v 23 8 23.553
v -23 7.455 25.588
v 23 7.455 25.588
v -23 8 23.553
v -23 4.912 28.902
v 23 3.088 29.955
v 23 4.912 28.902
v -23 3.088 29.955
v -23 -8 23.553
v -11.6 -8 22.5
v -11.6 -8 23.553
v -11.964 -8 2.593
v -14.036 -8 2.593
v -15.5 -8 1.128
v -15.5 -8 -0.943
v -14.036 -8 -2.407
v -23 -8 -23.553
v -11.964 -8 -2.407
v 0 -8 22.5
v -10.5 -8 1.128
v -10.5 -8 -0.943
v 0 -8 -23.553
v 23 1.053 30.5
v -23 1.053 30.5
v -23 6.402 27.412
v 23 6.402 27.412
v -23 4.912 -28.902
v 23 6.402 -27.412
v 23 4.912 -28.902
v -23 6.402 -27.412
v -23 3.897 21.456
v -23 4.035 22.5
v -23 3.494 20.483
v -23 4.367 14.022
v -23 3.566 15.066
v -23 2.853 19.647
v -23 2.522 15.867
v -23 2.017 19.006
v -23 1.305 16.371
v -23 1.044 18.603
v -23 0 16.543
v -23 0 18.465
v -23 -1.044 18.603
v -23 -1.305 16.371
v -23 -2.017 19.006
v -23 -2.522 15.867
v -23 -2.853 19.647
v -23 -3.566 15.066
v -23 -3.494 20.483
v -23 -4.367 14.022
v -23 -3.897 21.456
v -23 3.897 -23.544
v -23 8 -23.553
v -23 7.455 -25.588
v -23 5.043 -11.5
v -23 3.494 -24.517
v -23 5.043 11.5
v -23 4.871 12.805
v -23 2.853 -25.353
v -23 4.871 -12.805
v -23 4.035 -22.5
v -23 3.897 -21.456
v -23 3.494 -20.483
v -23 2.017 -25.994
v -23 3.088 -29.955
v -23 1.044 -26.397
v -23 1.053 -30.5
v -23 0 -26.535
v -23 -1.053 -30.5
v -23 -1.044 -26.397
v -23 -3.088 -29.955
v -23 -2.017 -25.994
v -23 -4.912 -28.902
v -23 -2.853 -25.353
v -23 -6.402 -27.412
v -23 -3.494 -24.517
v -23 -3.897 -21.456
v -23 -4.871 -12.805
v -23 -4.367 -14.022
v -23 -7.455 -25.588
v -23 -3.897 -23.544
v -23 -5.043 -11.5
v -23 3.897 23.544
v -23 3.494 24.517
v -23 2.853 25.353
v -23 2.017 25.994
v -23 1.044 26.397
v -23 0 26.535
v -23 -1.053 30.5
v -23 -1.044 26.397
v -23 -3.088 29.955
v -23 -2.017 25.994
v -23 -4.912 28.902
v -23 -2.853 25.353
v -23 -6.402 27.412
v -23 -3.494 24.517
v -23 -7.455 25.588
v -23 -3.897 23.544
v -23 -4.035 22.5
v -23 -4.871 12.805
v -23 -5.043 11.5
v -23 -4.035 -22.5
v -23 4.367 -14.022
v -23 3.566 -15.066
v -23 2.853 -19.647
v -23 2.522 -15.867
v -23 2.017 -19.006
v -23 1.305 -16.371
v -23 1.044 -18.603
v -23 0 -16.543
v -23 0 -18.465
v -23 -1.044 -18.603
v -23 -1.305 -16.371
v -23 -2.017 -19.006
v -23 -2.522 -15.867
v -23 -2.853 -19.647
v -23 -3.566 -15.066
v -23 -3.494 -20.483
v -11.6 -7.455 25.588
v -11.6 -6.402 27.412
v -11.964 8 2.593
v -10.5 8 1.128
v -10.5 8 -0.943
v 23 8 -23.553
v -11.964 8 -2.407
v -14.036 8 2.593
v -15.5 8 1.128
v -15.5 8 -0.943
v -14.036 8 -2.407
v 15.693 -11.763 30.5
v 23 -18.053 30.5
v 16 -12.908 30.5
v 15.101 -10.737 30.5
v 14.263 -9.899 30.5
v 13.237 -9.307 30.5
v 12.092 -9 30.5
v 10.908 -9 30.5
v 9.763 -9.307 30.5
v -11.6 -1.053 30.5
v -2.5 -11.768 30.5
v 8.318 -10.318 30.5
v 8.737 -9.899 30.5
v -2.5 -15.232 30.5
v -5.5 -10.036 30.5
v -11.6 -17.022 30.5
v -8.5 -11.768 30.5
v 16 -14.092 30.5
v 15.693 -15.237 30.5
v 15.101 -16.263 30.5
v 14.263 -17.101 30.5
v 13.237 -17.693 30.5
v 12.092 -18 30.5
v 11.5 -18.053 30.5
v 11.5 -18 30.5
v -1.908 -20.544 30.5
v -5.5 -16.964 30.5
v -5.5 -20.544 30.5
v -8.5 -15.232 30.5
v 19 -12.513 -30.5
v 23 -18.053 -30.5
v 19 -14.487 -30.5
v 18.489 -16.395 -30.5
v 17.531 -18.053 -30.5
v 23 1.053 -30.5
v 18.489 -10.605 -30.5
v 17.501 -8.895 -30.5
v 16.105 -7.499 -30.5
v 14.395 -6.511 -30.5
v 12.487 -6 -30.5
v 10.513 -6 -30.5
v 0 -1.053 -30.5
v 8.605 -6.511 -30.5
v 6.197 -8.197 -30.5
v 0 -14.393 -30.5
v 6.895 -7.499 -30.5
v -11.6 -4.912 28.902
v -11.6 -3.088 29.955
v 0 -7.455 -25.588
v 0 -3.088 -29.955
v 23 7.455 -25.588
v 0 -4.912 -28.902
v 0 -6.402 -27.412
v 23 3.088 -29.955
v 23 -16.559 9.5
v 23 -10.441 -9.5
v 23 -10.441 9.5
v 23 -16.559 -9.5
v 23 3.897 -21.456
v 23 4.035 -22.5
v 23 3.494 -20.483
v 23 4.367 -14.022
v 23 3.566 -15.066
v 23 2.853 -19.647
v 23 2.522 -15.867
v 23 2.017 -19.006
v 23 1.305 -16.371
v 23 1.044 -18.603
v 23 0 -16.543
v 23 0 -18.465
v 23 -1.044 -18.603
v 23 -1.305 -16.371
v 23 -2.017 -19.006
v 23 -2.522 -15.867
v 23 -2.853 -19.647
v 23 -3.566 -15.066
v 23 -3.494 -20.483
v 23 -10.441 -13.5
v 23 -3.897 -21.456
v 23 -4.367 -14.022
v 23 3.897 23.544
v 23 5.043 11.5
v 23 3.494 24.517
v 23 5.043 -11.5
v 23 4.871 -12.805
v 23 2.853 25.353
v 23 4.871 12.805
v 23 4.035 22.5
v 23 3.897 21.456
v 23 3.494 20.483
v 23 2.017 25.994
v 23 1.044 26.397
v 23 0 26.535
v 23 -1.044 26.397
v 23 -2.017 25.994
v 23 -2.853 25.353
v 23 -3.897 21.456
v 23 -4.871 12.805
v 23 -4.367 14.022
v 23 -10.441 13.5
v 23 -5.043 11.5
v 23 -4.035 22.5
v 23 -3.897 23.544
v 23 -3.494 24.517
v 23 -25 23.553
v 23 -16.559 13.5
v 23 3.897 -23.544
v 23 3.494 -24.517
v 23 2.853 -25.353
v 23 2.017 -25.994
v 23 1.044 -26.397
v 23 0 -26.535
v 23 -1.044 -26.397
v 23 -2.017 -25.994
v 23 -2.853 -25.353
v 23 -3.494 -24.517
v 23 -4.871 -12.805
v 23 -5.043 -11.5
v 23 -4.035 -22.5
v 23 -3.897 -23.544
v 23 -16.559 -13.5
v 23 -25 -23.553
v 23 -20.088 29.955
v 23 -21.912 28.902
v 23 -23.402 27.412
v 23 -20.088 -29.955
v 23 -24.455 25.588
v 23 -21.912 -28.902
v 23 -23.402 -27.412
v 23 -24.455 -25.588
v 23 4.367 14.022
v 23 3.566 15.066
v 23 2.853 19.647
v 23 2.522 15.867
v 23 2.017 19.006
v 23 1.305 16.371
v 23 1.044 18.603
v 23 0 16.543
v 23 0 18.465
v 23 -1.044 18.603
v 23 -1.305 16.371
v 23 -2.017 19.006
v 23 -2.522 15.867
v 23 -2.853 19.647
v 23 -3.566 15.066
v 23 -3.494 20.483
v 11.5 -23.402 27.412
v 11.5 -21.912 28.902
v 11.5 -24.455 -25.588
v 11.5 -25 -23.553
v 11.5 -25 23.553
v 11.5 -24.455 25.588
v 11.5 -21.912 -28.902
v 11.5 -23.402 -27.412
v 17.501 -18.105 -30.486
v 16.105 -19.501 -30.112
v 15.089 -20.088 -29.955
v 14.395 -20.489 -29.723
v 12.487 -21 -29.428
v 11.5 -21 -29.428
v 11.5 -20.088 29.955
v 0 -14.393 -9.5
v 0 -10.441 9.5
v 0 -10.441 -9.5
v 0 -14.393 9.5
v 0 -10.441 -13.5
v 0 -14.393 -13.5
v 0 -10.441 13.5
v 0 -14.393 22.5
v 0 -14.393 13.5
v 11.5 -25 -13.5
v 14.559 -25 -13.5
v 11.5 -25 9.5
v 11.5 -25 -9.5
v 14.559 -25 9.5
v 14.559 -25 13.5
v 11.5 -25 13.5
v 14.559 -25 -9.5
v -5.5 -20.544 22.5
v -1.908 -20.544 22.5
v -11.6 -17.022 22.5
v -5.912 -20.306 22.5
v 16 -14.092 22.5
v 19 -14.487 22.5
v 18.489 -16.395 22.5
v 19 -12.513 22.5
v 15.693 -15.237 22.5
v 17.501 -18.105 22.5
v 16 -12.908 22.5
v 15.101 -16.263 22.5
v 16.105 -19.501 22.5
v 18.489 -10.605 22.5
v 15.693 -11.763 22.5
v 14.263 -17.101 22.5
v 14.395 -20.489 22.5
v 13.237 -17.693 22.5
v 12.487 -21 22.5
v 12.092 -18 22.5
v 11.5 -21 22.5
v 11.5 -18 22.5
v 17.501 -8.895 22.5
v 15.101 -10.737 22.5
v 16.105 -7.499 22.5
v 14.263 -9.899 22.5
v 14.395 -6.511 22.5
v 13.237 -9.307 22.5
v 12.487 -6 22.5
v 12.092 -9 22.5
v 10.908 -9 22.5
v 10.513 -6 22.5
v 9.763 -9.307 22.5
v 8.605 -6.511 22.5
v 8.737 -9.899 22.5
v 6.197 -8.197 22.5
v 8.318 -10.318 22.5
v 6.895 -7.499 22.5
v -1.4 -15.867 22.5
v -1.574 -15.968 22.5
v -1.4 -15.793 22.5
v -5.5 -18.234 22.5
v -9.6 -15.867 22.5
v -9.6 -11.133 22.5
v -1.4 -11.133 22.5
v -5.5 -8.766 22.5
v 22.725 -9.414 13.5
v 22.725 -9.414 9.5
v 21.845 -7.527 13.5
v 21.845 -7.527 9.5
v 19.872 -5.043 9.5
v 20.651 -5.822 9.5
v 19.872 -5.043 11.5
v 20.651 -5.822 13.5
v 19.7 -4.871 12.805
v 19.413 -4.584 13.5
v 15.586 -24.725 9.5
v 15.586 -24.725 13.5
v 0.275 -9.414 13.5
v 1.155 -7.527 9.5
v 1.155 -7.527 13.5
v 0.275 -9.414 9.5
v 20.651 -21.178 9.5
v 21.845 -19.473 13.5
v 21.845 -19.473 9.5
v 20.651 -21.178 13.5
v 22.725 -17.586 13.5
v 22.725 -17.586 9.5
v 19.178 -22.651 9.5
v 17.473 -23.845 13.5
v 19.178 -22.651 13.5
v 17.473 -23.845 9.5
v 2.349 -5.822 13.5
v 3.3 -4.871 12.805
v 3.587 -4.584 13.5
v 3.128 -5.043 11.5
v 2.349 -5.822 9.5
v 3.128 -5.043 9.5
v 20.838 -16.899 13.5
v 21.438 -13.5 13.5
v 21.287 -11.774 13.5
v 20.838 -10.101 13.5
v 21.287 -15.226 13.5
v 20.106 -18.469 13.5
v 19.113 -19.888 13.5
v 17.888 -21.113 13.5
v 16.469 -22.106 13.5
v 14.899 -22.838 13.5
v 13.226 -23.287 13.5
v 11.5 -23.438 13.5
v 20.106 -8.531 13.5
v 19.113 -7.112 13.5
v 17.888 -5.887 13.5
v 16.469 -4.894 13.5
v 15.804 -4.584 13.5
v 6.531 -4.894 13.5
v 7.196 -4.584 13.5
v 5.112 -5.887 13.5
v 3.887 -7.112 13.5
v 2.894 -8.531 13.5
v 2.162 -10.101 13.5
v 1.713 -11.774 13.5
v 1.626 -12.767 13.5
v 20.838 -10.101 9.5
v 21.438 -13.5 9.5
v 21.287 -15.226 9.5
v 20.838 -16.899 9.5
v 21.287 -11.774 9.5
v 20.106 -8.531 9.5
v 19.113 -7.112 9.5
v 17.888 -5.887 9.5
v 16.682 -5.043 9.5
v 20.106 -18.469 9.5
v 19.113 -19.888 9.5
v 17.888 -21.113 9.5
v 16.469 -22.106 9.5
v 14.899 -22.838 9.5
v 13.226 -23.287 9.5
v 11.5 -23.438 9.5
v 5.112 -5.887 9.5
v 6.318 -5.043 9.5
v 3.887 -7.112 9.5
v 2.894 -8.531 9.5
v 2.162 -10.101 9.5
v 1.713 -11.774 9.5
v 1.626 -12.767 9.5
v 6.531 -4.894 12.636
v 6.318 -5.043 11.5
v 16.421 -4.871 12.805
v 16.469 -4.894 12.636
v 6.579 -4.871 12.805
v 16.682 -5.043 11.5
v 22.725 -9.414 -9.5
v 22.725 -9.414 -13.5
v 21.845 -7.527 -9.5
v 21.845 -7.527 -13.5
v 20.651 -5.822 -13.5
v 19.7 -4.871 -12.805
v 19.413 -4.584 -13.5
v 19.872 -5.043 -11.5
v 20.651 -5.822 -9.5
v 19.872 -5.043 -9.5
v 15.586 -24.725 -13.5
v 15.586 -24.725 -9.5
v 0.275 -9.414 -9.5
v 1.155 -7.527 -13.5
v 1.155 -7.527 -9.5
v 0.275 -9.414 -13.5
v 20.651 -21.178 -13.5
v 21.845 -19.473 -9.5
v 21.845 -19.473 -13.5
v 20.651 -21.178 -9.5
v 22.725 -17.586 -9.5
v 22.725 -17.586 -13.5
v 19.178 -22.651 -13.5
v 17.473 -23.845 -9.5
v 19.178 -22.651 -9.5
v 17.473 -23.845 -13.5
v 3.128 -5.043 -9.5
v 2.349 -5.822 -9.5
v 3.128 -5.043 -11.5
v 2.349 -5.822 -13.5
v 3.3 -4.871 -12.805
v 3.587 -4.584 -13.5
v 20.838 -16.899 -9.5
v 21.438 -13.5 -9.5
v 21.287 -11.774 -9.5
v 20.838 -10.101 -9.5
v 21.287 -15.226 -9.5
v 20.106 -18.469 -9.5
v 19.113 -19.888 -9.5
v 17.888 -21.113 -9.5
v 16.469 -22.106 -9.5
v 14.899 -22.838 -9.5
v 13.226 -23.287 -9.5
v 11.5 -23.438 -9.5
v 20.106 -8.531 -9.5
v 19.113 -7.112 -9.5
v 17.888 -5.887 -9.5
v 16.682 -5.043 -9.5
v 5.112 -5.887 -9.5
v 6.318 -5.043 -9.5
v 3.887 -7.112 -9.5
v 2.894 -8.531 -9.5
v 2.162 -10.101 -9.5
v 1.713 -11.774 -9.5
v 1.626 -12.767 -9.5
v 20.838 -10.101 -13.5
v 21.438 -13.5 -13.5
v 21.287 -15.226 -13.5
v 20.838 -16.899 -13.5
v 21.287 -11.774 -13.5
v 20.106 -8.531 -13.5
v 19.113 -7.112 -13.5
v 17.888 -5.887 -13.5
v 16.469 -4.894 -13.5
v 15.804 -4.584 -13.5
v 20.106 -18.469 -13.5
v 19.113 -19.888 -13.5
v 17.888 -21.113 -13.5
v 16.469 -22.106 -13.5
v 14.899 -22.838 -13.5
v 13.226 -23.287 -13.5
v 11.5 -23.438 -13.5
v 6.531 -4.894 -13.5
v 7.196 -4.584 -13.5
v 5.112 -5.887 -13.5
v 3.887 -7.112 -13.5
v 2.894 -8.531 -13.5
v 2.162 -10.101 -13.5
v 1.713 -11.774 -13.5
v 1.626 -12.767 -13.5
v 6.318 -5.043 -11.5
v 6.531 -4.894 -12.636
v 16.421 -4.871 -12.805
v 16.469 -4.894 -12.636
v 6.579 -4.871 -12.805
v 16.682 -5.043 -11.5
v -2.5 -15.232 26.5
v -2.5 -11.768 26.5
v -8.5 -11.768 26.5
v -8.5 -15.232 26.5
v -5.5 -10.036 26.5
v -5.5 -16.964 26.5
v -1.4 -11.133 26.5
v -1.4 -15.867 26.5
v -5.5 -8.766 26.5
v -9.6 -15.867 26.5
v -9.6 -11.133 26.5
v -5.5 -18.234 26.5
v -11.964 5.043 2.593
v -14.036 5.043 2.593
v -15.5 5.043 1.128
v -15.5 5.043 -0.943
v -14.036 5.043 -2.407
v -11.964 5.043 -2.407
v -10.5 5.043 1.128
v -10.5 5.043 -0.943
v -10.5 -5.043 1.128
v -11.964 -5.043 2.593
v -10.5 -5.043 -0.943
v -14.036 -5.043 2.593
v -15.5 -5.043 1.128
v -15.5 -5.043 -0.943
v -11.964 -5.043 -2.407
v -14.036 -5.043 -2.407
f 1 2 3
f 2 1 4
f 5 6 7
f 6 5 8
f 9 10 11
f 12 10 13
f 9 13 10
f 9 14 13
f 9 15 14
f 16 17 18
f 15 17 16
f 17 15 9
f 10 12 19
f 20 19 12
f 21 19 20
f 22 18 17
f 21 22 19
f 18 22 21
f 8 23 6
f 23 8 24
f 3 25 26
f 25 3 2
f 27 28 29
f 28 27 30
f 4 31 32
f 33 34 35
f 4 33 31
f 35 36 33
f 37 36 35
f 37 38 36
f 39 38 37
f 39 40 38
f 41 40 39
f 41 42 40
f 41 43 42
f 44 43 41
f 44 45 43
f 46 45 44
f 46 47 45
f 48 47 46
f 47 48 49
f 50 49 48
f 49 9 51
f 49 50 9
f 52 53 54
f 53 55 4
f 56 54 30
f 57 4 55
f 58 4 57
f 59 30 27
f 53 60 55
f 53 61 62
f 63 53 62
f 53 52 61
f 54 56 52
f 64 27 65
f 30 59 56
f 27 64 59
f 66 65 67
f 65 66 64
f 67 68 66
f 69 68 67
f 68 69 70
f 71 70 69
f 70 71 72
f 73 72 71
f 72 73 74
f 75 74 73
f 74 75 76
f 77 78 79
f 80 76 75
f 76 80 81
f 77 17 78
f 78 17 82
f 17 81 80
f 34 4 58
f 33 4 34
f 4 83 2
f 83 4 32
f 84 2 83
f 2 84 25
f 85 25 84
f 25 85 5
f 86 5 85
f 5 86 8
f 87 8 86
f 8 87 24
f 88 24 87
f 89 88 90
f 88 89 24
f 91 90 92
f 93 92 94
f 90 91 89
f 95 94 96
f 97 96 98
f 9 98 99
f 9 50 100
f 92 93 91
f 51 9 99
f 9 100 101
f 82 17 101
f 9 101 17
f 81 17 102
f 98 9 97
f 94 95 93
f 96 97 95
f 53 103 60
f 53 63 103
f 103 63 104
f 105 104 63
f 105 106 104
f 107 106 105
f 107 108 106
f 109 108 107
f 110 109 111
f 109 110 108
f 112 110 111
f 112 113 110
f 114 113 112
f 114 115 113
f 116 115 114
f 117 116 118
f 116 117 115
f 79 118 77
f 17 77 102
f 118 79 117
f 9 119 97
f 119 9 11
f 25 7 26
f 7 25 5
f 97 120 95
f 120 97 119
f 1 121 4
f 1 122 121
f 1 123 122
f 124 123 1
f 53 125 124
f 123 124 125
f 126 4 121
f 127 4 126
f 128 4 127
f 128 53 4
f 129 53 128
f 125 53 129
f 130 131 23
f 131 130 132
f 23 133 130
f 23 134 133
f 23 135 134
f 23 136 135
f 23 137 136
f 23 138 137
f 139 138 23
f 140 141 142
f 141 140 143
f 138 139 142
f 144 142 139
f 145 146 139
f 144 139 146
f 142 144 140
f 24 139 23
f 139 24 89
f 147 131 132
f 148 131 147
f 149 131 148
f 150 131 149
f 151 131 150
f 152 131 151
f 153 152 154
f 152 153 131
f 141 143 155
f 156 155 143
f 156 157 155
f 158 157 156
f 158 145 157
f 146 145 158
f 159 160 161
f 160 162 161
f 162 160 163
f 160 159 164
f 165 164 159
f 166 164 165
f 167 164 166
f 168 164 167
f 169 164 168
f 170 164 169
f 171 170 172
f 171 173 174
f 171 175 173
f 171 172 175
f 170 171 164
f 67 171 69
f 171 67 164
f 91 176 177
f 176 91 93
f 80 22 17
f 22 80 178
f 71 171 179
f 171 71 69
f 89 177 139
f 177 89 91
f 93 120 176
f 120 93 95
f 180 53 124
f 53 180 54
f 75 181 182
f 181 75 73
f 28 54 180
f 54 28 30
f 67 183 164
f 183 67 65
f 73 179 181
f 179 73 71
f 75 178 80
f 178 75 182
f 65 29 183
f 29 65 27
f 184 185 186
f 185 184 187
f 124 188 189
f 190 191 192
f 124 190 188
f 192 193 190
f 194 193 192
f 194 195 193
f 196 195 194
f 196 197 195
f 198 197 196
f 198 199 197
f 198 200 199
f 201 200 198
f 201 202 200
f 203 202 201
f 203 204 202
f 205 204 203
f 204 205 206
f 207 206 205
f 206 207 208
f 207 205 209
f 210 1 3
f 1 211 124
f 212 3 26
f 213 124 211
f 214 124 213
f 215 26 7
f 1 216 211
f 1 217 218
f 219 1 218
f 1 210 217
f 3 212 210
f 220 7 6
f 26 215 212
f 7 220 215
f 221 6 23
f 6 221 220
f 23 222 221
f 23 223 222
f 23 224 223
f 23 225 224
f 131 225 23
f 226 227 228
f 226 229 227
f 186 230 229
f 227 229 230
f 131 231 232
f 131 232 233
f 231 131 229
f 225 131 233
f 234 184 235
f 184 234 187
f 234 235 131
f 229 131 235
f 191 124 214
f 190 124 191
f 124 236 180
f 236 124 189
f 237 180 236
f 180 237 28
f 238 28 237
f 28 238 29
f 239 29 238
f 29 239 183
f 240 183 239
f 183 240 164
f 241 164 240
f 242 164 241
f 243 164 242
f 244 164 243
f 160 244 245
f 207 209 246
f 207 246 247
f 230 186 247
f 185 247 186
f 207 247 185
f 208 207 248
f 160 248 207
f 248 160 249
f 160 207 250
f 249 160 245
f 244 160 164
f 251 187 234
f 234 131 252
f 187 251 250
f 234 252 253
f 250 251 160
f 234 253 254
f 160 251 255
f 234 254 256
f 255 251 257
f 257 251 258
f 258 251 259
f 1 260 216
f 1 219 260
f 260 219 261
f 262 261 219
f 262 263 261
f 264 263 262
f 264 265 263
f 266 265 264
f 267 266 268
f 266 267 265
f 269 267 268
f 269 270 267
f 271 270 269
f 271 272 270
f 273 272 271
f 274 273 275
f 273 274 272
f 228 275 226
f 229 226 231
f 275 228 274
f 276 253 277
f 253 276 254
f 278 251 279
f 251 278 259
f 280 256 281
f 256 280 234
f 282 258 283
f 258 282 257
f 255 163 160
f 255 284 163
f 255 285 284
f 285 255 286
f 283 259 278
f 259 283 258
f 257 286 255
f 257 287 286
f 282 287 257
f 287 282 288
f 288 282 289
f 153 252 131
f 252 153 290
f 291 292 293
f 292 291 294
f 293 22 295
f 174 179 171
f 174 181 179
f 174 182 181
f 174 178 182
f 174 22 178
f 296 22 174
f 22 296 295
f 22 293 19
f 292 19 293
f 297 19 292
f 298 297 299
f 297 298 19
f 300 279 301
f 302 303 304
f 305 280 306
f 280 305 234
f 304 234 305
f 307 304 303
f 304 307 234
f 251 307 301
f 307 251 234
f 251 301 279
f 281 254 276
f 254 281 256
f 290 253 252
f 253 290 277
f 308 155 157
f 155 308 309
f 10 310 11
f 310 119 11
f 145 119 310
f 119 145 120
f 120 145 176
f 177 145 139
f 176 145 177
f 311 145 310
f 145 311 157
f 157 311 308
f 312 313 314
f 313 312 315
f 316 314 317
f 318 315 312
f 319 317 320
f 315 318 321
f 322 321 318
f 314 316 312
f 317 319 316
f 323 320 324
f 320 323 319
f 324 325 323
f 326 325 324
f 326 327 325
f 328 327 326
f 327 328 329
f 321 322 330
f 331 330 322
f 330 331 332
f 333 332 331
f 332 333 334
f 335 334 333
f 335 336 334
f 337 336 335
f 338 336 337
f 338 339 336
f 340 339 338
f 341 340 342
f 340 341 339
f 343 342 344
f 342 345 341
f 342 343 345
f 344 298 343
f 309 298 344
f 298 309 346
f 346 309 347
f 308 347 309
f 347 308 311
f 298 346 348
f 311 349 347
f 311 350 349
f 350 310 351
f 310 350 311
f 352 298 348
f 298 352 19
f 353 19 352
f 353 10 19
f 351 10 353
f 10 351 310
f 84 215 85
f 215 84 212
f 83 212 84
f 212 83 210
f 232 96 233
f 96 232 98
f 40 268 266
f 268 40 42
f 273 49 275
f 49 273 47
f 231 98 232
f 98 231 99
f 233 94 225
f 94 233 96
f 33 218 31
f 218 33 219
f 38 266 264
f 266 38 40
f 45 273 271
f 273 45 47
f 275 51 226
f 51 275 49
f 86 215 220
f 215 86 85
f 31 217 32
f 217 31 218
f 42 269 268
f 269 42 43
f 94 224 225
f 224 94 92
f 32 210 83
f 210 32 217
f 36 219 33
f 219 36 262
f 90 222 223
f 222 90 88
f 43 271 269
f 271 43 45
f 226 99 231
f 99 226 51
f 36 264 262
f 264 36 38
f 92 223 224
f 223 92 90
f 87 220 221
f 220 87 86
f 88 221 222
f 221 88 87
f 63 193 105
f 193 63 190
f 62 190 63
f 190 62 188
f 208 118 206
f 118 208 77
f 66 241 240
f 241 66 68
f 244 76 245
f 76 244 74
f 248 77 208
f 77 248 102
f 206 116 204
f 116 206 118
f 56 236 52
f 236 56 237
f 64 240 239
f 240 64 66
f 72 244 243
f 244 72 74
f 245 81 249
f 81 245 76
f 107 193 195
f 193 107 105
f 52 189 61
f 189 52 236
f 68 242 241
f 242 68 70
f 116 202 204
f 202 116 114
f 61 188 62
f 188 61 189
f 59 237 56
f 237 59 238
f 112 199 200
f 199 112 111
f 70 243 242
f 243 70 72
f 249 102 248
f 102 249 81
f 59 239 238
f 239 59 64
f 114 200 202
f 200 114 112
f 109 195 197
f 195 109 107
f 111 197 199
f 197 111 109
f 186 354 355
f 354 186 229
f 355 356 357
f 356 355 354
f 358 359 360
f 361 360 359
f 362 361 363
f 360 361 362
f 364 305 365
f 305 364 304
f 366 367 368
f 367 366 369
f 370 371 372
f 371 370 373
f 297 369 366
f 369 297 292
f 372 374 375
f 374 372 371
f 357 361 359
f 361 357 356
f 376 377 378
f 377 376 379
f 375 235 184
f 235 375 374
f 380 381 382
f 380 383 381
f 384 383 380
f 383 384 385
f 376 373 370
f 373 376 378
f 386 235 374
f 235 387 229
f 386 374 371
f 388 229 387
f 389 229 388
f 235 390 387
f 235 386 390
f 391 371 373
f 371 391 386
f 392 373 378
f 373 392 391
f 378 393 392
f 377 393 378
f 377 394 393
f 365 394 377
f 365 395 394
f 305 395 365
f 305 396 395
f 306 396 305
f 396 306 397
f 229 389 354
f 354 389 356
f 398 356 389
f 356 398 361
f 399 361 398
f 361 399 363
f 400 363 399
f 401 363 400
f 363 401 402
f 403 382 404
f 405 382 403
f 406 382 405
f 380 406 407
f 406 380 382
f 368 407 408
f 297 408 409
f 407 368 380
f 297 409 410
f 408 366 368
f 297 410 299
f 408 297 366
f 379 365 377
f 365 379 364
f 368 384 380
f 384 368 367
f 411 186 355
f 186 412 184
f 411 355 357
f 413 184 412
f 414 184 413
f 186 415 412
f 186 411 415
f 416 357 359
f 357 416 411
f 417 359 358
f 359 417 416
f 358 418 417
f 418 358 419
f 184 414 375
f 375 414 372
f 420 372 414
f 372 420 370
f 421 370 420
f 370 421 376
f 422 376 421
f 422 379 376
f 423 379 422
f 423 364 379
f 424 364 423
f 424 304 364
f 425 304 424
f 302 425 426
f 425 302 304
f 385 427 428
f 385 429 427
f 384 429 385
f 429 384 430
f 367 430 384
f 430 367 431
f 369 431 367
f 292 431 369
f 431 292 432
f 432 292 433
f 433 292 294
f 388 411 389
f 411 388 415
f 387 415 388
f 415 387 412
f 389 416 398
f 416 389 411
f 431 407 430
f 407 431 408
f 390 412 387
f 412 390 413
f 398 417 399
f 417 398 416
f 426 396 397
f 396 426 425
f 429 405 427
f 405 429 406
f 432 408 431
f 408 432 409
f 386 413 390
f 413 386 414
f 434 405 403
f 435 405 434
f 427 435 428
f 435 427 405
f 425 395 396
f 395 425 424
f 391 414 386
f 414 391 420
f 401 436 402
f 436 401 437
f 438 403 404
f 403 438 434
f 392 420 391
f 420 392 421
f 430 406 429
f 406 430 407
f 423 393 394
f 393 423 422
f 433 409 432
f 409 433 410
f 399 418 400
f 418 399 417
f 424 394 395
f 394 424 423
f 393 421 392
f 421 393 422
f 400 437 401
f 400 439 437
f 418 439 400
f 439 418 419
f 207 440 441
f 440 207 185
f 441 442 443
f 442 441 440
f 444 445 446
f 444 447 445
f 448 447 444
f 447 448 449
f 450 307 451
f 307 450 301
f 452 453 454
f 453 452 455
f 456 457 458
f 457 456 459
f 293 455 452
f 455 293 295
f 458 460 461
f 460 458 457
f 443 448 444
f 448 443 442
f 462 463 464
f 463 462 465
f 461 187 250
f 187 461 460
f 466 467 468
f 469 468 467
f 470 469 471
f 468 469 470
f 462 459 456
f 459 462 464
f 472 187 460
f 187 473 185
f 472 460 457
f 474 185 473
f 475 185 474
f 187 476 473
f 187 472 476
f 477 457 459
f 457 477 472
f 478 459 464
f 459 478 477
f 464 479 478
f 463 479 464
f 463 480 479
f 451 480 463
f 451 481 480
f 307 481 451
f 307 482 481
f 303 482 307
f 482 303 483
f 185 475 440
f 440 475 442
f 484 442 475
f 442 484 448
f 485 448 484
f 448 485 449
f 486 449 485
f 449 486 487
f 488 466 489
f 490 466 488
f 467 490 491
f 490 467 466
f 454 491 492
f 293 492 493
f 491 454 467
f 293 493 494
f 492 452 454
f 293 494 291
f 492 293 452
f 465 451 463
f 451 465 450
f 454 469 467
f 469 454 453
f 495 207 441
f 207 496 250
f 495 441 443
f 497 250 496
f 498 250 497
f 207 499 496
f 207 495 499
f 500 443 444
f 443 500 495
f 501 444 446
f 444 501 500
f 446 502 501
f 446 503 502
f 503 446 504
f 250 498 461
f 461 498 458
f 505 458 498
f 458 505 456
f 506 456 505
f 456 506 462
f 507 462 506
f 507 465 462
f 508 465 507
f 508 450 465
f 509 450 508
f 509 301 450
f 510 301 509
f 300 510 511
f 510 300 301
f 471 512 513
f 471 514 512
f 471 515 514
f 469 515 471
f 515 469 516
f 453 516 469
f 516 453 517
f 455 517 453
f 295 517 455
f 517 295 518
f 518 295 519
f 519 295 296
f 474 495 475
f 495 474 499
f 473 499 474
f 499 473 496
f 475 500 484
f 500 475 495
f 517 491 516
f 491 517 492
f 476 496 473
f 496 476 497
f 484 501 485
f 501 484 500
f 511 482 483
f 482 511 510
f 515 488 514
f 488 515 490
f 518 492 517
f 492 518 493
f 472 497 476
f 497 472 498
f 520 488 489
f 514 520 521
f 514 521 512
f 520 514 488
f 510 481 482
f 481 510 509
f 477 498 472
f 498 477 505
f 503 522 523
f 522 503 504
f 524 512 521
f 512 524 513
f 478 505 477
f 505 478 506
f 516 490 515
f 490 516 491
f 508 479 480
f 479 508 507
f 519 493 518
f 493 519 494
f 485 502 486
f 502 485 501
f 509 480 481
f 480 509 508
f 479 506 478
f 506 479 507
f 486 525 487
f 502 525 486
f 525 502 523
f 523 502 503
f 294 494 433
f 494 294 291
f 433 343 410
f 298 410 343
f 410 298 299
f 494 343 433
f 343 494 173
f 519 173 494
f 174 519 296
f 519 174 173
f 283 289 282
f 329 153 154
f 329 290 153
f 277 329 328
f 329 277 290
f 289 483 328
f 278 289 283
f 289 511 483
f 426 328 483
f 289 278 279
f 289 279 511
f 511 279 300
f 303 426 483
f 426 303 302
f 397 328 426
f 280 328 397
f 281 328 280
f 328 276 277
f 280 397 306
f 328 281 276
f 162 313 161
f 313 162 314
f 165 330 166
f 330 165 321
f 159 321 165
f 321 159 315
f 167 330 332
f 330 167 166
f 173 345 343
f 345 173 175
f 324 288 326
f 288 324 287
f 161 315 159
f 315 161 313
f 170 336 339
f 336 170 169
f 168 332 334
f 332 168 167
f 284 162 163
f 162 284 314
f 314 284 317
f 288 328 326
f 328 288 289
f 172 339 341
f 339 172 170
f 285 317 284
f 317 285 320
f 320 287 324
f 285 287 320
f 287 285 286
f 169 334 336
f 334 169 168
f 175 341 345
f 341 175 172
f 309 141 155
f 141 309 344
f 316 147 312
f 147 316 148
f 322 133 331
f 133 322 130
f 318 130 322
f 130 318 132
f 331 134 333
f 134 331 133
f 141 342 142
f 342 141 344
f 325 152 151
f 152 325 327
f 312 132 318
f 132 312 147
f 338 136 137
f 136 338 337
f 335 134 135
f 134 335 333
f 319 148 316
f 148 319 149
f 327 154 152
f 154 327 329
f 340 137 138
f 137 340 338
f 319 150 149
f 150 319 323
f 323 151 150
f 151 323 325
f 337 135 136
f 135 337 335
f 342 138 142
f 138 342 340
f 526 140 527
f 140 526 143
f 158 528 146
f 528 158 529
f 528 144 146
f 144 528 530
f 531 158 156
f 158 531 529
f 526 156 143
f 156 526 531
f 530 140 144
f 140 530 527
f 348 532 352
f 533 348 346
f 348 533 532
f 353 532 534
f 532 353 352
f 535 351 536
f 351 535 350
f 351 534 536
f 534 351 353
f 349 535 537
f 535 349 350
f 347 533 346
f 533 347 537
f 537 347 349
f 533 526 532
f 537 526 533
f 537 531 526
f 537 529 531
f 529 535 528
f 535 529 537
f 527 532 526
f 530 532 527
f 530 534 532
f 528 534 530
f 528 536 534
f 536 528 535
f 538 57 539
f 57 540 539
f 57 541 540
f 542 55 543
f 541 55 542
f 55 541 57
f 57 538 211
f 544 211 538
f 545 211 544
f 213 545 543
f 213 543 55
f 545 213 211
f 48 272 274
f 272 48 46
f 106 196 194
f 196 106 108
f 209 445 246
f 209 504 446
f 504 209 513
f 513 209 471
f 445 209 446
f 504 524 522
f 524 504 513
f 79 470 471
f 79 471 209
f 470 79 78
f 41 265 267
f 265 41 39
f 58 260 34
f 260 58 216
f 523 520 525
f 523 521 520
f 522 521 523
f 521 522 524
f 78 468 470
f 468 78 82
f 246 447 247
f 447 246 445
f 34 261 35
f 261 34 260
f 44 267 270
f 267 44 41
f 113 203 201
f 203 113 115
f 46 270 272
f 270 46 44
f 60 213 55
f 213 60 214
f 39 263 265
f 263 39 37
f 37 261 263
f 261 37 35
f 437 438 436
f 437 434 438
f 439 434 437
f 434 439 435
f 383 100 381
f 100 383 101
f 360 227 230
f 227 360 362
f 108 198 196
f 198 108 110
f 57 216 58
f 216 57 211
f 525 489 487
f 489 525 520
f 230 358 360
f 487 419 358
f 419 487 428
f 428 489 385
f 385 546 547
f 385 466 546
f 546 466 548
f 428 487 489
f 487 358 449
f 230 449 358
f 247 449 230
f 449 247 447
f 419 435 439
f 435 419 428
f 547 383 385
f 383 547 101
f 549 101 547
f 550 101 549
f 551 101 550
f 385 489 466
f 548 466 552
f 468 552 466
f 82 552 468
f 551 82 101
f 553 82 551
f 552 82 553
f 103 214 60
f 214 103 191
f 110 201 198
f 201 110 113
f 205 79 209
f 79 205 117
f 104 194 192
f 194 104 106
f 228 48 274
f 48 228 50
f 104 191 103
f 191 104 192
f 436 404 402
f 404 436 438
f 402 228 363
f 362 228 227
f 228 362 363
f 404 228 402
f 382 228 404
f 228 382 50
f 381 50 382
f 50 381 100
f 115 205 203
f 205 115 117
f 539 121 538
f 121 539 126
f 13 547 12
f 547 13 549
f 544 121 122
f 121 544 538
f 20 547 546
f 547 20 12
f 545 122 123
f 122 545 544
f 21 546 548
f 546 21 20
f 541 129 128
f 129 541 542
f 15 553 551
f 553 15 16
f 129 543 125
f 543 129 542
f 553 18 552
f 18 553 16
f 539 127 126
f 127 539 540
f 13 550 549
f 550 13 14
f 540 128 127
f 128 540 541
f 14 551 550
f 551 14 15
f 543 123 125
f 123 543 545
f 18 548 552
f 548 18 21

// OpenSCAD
// file: util.scad
function accurate_diam(diam,sides) = 1 / cos(180/sides) / 2 * diam;
function accurate_vertice_diam(diam,sides) = 1 / cos(180/sides) / 2 * diam;

module hole(diam,len,sides=8) {
  cylinder(r=accurate_diam(diam,sides),h=len,center=true,$fn=sides);
}
// file: config.scad
left   = -1;
right  = 1;
top    = 1;
bottom = -1;
front  = -1;
rear   = 1;

approximate_pi   = 3.14159265359;

extrusion_height = 0.3;
extrusion_width  = 0.5;
resolution       = 24;
rotation         = 180/resolution; // if possible, have faces line up with cubes

min_material_thickness = extrusion_width*4;

wall_thickness   = 2;
nut_diam         = 5.65; // 5.5 + clearance
nut_thickness    = 2;

motor_side       = 43; // nema17

bearing_inner_diam = 8;
bearing_outer_diam = 15;
bearing_length     = 4;

// 623
idler_outer_diam   = 10;
idler_inner_diam   = 3;
idler_thickness    = 4;

// 625
idler_outer_diam   = 16;
idler_inner_diam   = 5;
idler_thickness    = 5;

// MR105
idler_outer_diam   = 10;
idler_inner_diam   = 5;
idler_thickness    = 4;

belt_width         = 2;
belt_thickness     = 6;
belt_pitch         = 2;
belt_pulley_circ   = belt_pitch*16;
belt_pulley_diam   = belt_pulley_circ / approximate_pi;
// main file
include <config.scad>;
use <util.scad>;

x_rod_spacing           = 45;
smooth_threaded_spacing = 17;

base_depth  = bearing_inner_diam + min_material_thickness*4;
base_width  = motor_side/2 + smooth_threaded_spacing + bearing_outer_diam/2;
base_height = x_rod_spacing + bearing_inner_diam + min_material_thickness*4;

belt_opening_depth  = idler_thickness*2 + 2;
belt_opening_height = x_rod_spacing - bearing_inner_diam - min_material_thickness*2;

leadscrew_diam          = 5;
leadscrew_nut_diam      = 8.2;
leadscrew_nut_thickness = 4;

bearing_retainer_diam   = bearing_outer_diam + min_material_thickness*4;
bearing_dist_from_x_rod = bearing_inner_diam/2+min_material_thickness+bearing_outer_diam/2;
bearing_pos_x           = base_width/2-bearing_retainer_diam/2;
bearing_pos_y           = bearing_dist_from_x_rod*front;

smooth_rod_hole_diam    = bearing_inner_diam + 1;

leadscrew_pos_x           = bearing_pos_x+(left*smooth_threaded_spacing);
leadscrew_pos_y           = bearing_pos_y;
leadscrew_retainer_diam   = leadscrew_nut_diam+min_material_thickness*2;
leadscrew_retainer_height = leadscrew_nut_thickness*2;

zip_tie_hole_width     = 4;
zip_tie_hole_thickness = 4;

echo("BASE_HEIGHT - LEADSCREW_RETAINER_HEIGHT: ", base_height - leadscrew_retainer_height);

module zip_tie_hole(fit_around_diam) {
  difference() {
    hole(fit_around_diam+zip_tie_hole_thickness,zip_tie_hole_width,36);
    hole(fit_around_diam,zip_tie_hole_width+1,36);
  }
}

module x_end_base() {
  module body() {
    // z rod material, main body
    hull() {
      for (side=[top,bottom]) {
        translate([0,0,x_rod_spacing/2*side]) {
          rotate([0,90,0]) {
            rotate([0,0,rotation]) {
              hole(base_depth,base_width,resolution);
            }
          }
        }
      }
    }

    // z bearing retainer
    hull() {
      translate([bearing_pos_x,0,0]) {
        translate([0,front*bearing_dist_from_x_rod/2,0]) {
          cube([bearing_retainer_diam,bearing_dist_from_x_rod,base_height],center=true);
        }
        translate([0,front*(bearing_dist_from_x_rod+bearing_retainer_diam/2-base_depth/2),0]) {
          //cube([bearing_retainer_diam,bearing_retainer_diam,base_height],center=true);
          for(side=[top,bottom]) {
            translate([0,0,x_rod_spacing/2*side]) {
              rotate([0,90,0]) {
                rotate([0,0,rotation]) {
                  hole(base_depth,bearing_retainer_diam,resolution);
                }
              }
            }
          }
        }
      }
    }

    leadscrew_retainer_edge_to_edge = leadscrew_retainer_diam*1.125;
    // z leadscrew nut retainer
    hull() {
      translate([0,0,base_height/2-leadscrew_retainer_height/2]) {
        translate([leadscrew_pos_x,0,0]) {
          translate([0,leadscrew_pos_y,0]) {
            rotate([0,0,90]) {
              hole(leadscrew_retainer_diam,leadscrew_retainer_height,6);
            }
          }
          cube([leadscrew_retainer_diam,0.5,leadscrew_retainer_height],center=true);
          translate([smooth_threaded_spacing/2,bearing_pos_y,0]) {
            rotate([0,0,90]) {
              hole(leadscrew_retainer_diam,leadscrew_retainer_height,6);
            }
          }
        }
      }
    }
  }

  module holes() {
    // x smooth_rods
    for(side=[top,bottom]) {
      translate([0,0,x_rod_spacing/2*side]) {
        rotate([0,90,0]) {
          hole(bearing_inner_diam,100,resolution);
        }
      }
    }

    // bearing zip ties
    for (side=[top,bottom]) {
      translate([bearing_pos_x,bearing_pos_y,side*(belt_opening_height/2-belt_opening_depth/2)]) {
        zip_tie_hole(bearing_retainer_diam-zip_tie_hole_thickness*.8);
      }
    }

    // bearing retainer
    translate([bearing_pos_x,bearing_pos_y,0]) {
      // cavity for bearing
      translate([0,0,leadscrew_retainer_height*bottom]) {
        hull() {
          translate([bearing_outer_diam/4*left,bearing_retainer_diam/2*front,0]) {
            cube([bearing_outer_diam/2,bearing_retainer_diam,base_height],center=true);
          }
          rotate([0,0,-45]) {
            translate([bearing_outer_diam/4*left,bearing_retainer_diam/2*front,0]) {
              cube([bearing_outer_diam/2,bearing_retainer_diam,base_height],center=true);
            }
          }
        }
        rotate([0,0,rotation]) {
          hole(bearing_outer_diam,base_height,resolution);
        }
      }

      // clearance for smooth rod allowing for support of leadscrew nut
      hull() {
        translate([smooth_rod_hole_diam/4*left,bearing_retainer_diam/2*front,0]) {
          cube([smooth_rod_hole_diam/2,bearing_retainer_diam,base_height+1],center=true);
        }
        rotate([0,0,-45]) {
          translate([smooth_rod_hole_diam/4*left,bearing_retainer_diam/2*front,0]) {
            cube([smooth_rod_hole_diam/2,bearing_retainer_diam,base_height+1],center=true);
          }
        }
      }
      rotate([0,0,rotation]) {
        hole(smooth_rod_hole_diam,base_height+1,resolution);
      }
    }

    // leadscrew shaft and captive nut
    translate([leadscrew_pos_x,leadscrew_pos_y,0]) {
      rotate([0,0,90]) {
        hole(leadscrew_diam+1,base_height+1,6);
      }
      translate([0,0,base_height/2-leadscrew_retainer_height]) {
        rotate([0,0,90]) {
          hole(leadscrew_nut_diam,leadscrew_nut_thickness*2,6);
        }
      }
    }

    // idler/belt opening
    hull() {
      for(side=[top,bottom]) {
        translate([0,0,(belt_opening_height/2-belt_opening_depth/2)*side]) {
          rotate([0,90,0]) {
            hole(belt_opening_depth,100,resolution);
          }
        }
      }
    }

    // idler screw shaft
    translate([(base_width/2-idler_outer_diam)*left,0,belt_pulley_diam/2-idler_outer_diam/2]) {
      rotate([90,0,0]) {
        rotate([0,0,22.5]) {
          hole(idler_inner_diam,base_depth+1,8);
        }
      }
    }
  }

  % translate([0,bearing_pos_y,0]) {
    translate([bearing_pos_x,0,0]) {
      cylinder(r=bearing_inner_diam/2,h=100,center=true,$fn=24);
    }
    translate([leadscrew_pos_x,0,0]) {
      cylinder(r=leadscrew_diam/2,h=100,center=true,$fn=24);
    }
  }

  difference() {
    body();
    holes();
  }
}

x_end_base();
